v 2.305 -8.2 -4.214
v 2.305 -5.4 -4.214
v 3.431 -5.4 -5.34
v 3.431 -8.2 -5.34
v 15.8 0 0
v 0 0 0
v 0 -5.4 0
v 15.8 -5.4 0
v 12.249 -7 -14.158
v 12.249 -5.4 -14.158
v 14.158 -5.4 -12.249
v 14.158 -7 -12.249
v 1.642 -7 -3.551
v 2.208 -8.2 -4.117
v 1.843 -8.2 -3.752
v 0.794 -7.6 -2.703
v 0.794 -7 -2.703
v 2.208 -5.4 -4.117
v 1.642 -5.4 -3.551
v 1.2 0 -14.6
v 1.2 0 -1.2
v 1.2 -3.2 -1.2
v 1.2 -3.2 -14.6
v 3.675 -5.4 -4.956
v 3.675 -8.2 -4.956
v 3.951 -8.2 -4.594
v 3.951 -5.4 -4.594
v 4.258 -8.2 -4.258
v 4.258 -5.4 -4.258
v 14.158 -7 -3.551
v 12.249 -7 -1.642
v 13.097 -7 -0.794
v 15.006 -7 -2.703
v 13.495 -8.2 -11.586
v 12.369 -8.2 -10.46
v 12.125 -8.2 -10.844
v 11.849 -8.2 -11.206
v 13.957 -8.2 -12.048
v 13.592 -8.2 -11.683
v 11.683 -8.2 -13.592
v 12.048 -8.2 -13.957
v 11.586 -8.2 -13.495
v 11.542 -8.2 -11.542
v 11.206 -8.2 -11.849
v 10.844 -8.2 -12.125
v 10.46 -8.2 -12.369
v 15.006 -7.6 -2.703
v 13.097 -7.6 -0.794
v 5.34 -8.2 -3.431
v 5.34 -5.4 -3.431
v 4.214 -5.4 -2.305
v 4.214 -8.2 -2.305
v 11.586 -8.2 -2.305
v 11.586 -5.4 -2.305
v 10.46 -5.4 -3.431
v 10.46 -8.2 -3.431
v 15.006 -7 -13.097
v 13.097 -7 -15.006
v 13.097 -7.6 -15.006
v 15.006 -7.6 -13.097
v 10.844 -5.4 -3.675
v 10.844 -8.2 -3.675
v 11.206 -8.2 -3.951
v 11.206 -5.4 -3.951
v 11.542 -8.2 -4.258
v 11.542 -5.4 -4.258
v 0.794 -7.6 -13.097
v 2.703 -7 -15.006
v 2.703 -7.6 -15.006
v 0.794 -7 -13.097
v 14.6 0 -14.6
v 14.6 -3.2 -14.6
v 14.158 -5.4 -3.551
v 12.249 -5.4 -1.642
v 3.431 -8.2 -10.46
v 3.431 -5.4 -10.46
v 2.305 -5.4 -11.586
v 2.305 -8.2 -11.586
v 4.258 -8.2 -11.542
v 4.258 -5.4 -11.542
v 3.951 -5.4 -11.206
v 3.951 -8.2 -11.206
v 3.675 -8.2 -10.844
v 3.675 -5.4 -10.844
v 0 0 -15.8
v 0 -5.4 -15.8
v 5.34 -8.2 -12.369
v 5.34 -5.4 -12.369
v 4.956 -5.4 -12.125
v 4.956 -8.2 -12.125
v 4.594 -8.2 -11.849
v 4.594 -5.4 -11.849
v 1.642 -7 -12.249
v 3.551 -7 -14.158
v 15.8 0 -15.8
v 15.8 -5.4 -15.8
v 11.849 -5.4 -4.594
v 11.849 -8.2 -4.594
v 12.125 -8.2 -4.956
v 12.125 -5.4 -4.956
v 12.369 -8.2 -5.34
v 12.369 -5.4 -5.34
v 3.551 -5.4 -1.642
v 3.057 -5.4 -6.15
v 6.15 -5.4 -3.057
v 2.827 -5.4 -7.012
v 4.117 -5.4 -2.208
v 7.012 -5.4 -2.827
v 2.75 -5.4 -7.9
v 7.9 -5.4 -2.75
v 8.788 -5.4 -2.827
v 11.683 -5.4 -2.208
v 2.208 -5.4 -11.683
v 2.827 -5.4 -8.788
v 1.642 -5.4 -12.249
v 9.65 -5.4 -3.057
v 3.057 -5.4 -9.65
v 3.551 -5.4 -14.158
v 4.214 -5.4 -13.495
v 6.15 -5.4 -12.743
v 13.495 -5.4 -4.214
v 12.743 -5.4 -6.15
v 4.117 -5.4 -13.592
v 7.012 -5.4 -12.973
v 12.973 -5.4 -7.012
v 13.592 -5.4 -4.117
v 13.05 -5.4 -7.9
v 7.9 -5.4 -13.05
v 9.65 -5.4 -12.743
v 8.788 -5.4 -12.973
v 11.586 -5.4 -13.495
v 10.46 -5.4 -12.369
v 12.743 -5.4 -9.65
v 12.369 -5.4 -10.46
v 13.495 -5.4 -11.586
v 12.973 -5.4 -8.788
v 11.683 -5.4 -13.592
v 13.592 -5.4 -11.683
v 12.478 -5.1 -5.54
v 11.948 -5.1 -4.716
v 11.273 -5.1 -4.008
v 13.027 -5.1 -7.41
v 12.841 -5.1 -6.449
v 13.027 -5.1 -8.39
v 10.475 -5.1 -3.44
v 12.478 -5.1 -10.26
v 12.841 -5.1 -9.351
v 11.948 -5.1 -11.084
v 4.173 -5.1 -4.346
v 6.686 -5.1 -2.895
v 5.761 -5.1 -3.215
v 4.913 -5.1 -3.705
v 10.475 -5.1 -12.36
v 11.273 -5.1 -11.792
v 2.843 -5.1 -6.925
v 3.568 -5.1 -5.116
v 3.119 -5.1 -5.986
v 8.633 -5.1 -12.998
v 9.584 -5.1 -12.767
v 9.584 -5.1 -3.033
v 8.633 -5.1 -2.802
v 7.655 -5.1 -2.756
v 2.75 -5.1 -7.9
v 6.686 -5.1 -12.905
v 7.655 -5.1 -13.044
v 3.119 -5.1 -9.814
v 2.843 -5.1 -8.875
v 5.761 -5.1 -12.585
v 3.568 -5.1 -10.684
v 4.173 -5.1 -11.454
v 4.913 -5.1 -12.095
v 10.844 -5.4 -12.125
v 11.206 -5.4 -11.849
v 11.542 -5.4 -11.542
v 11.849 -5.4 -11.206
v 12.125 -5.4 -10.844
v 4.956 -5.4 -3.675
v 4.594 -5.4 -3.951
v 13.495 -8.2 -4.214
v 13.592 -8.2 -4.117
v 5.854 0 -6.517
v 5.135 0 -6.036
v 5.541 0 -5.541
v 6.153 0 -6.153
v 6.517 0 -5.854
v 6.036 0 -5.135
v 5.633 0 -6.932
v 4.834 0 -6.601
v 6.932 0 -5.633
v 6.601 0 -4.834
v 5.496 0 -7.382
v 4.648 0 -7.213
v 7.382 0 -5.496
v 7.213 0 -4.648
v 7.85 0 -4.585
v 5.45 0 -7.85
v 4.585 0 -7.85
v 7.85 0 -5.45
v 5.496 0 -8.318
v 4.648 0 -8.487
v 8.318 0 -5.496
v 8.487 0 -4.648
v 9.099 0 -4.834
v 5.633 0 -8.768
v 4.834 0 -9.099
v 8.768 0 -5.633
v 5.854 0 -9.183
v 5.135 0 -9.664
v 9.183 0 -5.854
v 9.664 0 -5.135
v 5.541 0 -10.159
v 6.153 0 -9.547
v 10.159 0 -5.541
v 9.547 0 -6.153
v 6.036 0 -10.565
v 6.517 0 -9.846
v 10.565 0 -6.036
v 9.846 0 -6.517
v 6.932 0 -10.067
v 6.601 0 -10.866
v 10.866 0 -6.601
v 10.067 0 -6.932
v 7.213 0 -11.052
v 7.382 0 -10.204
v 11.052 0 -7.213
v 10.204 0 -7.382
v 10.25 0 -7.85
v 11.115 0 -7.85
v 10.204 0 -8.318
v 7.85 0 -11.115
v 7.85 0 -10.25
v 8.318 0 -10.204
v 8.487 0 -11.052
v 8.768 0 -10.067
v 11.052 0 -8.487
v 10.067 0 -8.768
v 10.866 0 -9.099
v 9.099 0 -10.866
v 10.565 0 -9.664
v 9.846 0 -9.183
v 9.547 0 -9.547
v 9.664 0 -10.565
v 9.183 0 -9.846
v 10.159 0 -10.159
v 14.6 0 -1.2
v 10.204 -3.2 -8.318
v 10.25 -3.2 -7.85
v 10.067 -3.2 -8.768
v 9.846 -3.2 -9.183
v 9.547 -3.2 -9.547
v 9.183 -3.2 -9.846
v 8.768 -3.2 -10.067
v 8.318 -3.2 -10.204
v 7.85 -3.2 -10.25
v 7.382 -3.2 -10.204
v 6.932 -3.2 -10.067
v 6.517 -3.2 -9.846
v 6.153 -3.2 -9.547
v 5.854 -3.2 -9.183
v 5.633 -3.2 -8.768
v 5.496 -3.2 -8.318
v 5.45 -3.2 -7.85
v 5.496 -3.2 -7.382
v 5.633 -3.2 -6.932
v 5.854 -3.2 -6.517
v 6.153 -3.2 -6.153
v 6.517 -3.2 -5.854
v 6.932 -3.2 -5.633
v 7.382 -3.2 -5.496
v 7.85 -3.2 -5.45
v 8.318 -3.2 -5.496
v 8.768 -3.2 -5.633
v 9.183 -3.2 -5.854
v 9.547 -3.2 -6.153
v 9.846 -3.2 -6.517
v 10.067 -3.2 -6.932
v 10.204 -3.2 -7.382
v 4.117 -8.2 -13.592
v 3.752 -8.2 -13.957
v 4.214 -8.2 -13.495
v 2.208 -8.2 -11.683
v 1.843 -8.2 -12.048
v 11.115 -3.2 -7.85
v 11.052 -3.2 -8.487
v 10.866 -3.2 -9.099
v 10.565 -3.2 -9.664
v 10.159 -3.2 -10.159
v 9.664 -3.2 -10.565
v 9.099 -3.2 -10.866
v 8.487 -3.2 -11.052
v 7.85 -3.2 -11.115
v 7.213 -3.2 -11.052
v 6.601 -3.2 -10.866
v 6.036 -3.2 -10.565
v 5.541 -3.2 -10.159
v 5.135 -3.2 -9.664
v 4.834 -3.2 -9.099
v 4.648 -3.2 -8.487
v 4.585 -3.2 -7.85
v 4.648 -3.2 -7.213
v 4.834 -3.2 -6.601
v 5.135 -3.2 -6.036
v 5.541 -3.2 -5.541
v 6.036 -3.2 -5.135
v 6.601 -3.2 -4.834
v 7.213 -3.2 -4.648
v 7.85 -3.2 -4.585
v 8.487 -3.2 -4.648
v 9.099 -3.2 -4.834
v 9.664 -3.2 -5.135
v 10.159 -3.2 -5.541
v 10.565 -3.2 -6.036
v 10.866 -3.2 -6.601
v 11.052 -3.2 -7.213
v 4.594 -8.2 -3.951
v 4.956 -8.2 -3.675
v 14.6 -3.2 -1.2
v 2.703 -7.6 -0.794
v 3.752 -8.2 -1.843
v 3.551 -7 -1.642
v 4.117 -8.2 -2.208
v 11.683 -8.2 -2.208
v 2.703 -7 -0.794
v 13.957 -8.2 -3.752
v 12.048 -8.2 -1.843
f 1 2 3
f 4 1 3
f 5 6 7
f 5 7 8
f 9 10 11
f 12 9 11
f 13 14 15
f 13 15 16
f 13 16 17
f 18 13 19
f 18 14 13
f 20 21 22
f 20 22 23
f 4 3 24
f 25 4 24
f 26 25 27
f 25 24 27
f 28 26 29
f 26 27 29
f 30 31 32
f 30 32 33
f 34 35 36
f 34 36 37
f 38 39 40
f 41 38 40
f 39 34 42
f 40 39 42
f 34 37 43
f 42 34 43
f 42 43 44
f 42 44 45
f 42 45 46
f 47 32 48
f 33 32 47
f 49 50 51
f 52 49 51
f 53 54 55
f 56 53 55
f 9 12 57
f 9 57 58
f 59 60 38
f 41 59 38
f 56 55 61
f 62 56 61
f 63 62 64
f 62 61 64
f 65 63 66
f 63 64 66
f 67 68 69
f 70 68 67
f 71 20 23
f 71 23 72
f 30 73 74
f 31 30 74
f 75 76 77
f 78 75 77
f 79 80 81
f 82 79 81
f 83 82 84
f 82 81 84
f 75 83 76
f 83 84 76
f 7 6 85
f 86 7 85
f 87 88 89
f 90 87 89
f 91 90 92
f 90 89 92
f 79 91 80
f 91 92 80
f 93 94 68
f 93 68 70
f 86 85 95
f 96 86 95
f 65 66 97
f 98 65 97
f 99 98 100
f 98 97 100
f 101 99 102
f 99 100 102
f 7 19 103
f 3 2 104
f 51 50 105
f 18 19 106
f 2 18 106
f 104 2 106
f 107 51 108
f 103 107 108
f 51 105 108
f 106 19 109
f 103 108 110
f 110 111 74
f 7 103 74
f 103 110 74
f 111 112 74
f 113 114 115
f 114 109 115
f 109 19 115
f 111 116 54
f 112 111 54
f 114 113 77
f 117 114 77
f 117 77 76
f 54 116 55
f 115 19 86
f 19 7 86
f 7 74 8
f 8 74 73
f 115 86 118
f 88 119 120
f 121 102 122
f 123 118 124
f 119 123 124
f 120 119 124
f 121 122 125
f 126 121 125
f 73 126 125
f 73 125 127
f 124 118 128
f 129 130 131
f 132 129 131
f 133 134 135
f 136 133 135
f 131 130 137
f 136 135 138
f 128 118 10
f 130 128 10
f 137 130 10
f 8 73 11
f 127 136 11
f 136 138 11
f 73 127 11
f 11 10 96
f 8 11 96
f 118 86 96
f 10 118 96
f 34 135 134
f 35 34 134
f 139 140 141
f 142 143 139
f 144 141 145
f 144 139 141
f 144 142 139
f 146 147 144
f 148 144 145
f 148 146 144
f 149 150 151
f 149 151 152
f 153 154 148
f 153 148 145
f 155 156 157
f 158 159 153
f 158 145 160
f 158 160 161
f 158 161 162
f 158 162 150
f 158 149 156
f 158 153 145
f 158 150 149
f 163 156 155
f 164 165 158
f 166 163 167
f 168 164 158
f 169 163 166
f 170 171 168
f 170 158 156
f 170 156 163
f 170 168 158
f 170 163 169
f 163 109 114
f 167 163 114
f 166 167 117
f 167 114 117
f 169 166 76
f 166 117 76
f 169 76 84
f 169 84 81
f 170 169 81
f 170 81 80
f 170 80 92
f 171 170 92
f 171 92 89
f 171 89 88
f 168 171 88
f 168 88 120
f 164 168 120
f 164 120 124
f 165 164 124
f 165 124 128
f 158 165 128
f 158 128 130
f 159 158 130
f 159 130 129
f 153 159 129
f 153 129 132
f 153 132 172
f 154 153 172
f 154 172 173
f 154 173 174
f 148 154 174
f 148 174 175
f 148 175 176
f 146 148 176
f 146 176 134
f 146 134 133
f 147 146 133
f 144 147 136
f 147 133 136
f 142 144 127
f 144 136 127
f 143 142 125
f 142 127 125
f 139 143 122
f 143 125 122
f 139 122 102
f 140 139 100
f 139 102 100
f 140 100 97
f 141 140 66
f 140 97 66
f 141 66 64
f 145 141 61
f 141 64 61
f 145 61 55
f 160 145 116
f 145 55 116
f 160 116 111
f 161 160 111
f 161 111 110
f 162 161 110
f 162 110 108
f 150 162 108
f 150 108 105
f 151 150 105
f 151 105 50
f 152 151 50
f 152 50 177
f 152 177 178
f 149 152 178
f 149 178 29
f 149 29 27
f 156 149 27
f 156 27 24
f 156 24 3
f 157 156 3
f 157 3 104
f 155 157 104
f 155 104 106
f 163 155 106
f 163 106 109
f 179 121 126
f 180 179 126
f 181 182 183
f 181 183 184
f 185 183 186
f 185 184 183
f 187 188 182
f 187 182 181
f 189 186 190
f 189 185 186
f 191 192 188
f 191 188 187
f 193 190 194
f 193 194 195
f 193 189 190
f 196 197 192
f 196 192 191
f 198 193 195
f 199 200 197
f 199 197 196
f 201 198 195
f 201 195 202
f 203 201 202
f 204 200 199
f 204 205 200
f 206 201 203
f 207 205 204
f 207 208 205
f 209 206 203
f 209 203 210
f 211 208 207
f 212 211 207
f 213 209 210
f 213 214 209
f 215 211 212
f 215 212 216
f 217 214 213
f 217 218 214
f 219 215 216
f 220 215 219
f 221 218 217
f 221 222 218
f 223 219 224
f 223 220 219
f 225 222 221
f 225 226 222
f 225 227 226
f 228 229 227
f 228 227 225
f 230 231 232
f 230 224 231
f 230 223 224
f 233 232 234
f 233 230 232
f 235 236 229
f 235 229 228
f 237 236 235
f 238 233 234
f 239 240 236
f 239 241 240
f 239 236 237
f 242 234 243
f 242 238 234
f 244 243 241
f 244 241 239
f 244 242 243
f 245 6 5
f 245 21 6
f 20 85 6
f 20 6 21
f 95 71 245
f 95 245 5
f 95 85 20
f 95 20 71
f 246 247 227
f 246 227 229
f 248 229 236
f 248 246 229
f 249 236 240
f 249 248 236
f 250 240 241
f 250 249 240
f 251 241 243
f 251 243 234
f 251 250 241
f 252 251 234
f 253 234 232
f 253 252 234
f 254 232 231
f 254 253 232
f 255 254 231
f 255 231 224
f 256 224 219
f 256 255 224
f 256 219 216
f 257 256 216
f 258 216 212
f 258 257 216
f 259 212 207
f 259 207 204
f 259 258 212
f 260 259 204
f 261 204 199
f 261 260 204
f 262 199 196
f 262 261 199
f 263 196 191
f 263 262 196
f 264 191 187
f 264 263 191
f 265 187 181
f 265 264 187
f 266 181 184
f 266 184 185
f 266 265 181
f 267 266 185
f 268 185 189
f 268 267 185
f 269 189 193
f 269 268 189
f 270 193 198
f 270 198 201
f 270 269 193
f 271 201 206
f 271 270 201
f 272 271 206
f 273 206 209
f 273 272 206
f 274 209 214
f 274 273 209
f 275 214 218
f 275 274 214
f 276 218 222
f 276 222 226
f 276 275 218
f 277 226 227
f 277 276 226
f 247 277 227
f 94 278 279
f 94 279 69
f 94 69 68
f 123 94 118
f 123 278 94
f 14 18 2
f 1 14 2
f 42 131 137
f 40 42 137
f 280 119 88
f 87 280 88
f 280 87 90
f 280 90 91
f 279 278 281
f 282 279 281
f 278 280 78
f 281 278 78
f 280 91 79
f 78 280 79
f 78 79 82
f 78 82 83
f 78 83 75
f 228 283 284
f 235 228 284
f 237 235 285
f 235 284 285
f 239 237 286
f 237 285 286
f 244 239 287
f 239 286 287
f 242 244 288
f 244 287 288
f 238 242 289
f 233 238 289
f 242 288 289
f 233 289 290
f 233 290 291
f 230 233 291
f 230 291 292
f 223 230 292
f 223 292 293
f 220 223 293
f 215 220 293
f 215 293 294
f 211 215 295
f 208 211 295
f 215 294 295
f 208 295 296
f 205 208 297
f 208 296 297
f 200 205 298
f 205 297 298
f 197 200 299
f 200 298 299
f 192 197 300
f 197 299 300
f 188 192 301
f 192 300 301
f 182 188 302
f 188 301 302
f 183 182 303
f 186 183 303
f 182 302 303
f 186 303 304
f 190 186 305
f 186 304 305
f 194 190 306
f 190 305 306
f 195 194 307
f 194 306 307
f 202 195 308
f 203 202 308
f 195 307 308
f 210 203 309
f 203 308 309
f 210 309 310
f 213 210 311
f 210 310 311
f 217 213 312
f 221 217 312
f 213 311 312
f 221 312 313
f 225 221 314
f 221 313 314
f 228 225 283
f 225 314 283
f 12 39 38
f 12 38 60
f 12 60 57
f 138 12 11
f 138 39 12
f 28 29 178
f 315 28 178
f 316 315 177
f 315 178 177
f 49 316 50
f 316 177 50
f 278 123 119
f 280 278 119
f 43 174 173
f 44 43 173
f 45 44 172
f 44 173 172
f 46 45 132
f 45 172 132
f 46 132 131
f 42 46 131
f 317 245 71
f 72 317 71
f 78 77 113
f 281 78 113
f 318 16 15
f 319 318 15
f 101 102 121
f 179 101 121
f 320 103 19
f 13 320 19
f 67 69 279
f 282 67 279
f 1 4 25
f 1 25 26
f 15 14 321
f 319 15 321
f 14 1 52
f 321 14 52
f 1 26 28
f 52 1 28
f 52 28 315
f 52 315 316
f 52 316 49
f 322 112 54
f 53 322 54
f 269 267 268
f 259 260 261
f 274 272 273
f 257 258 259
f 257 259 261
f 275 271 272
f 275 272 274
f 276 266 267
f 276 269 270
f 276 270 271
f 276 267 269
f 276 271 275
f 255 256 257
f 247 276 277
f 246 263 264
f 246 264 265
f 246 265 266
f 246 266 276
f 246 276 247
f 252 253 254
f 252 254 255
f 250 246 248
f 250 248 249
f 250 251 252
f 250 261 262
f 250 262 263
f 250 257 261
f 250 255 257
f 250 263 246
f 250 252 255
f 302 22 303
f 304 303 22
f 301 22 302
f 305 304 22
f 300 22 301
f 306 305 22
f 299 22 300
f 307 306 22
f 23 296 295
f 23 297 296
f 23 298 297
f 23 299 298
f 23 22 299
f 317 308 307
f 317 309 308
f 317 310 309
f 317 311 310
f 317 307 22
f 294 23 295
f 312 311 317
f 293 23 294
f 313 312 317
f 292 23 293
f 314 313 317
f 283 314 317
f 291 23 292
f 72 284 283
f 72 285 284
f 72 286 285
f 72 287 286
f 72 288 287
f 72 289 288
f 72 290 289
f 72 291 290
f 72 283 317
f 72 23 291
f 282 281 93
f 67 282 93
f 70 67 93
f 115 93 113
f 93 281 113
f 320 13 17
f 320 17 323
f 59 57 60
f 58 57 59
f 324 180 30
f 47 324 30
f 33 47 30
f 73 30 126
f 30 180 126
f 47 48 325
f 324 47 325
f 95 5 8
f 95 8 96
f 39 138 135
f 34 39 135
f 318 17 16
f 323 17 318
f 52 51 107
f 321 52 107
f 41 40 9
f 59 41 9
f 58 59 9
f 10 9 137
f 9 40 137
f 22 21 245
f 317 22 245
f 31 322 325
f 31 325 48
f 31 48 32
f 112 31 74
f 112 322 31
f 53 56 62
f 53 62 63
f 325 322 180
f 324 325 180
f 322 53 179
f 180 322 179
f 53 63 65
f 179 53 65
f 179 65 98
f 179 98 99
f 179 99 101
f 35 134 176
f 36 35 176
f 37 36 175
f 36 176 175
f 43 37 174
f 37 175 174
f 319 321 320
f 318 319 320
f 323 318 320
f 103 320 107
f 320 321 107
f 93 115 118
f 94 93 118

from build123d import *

# Parameters (mm, degrees)
SKETCH2_W            = 15.8
SKETCH2_H            = 15.8
BOSS_EXTRUDE2_DEPTH  = 5.4
SKETCH4_W            = 13.4
SKETCH4_H            = 13.4
CUT_EXTRUDE1_DEPTH   = 3.2
SKETCH7_R            = 3.265
SKETCH7_R_2          = 2.4
BOSS_EXTRUDE5_DEPTH  = 3.2
SKETCH8_R            = 5.15
CUT_EXTRUDE2_DEPTH   = 0.3
BOSS_EXTRUDE8_DEPTH  = 2.8
SKETCH27_W           = 2.7
SKETCH27_H           = 1.2
BOSS_EXTRUDE10_DEPTH = 1.2
CUT_EXTRUDE3_DEPTH   = 2.7
CIRPATTERN1_COUNT    = 4


with BuildPart() as part:
    # Sketch2 → Boss-Extrude2 (new body)
    with BuildSketch(Plane(origin=(0, 0, 0), x_dir=(1, 0, 0), z_dir=(0, 1, 0))):
        with Locations((7.9, 7.9)):
            Rectangle(SKETCH2_W, SKETCH2_H)
    extrude(amount=-BOSS_EXTRUDE2_DEPTH)

    # Sketch4 → Cut-Extrude1 (cut)
    with BuildSketch(Plane(origin=(0, 0, 0), x_dir=(1, 0, 0), z_dir=(0, 1, 0))):
        with Locations((7.9, 7.9)):
            Rectangle(SKETCH4_W, SKETCH4_H)
    extrude(amount=-CUT_EXTRUDE1_DEPTH, mode=Mode.SUBTRACT)

    # Sketch7 → Boss-Extrude5 (add)
    with BuildSketch(Plane(origin=(0, -3.2, 0), x_dir=(1, 0, 0), z_dir=(0, 1, 0))):
        with Locations((7.85, 7.85)):
            Circle(SKETCH7_R)
        with Locations((7.85, 7.85)):
            Circle(SKETCH7_R_2, mode=Mode.SUBTRACT)
    extrude(amount=BOSS_EXTRUDE5_DEPTH)

    # Sketch8 → Cut-Extrude2 (cut)
    with BuildSketch(Plane(origin=(0, -5.4, 0), x_dir=(-1, 0, 0), z_dir=(0, -1, 0))):
        with Locations((-7.9, 7.9)):
            Circle(SKETCH8_R)
    extrude(amount=-CUT_EXTRUDE2_DEPTH, mode=Mode.SUBTRACT)

    # Sketch11 → Boss-Extrude8 (add)
    with BuildSketch(Plane.XZ.offset(5.4)):
        Polygon((11.683021279, -2.207790411), (12.637615434, -3.162384566), (13.203300859, -2.596699141), (12.248706704, -1.642104986), align=None)
        with BuildLine():
            ThreePointArc((11.585853022, -2.304958669), (12.133497372, -2.706975833), (12.637615434, -3.162384566))
            Line((12.637615434, -3.162384566), (11.683021279, -2.207790411))
            Line((11.683021279, -2.207790411), (11.585853022, -2.304958669))
        make_face()
        with BuildLine():
            ThreePointArc((10.459662524, -3.431149167), (11.028098464, -3.808851017), (11.541599923, -4.258400077))
            Line((11.541599923, -4.258400077), (12.637615434, -3.162384566))
            ThreePointArc((12.637615434, -3.162384566), (12.133497372, -2.706975833), (11.585853022, -2.304958669))
            Line((11.585853022, -2.304958669), (10.459662524, -3.431149167))
        make_face()
        with BuildLine():
            Line((12.637615434, -3.162384566), (11.541599923, -4.258400077))
            ThreePointArc((11.541599923, -4.258400077), (11.991148983, -4.771901536), (12.368850833, -5.340337476))
            Line((12.368850833, -5.340337476), (13.495041331, -4.214146978))
            ThreePointArc((13.495041331, -4.214146978), (13.093024167, -3.666502628), (12.637615434, -3.162384566))
        make_face()
        with BuildLine():
            Line((13.592209589, -4.116978721), (12.637615434, -3.162384566))
            ThreePointArc((12.637615434, -3.162384566), (13.093024167, -3.666502628), (13.495041331, -4.214146978))
            Line((13.495041331, -4.214146978), (13.592209589, -4.116978721))
        make_face()
        Polygon((13.203300859, -2.596699141), (12.637615434, -3.162384566), (13.592209589, -4.116978721), (14.157895014, -3.551293296), align=None)
    boss_extrude8 = extrude(amount=BOSS_EXTRUDE8_DEPTH)

    # Sketch27 → Boss-Extrude10 (add)
    with BuildSketch(Plane(origin=(5.303300859, 0, 5.303300859), x_dir=(0.707106781, 0, -0.707106781), z_dir=(0.707106781, 0, 0.707106781))):
        with Locations((11.172287143, -7.6)):
            Rectangle(SKETCH27_W, SKETCH27_H)
    boss_extrude10 = extrude(amount=BOSS_EXTRUDE10_DEPTH)

    # Sketch28 → Cut-Extrude3 (cut)
    with BuildSketch(Plane(origin=(6.945405845, 0, -6.945405845), x_dir=(0.707106781, 0, 0.707106781), z_dir=(-0.707106781, 0, 0.707106781))):
        Polygon((8.7, -7.6), (7.215606324, -8.2), (8.7, -8.2), align=None)
    cut_extrude3 = extrude(amount=-CUT_EXTRUDE3_DEPTH, mode=Mode.SUBTRACT)

    # CirPattern1: Boss-Extrude8, Boss-Extrude10, Cut-Extrude3 ×4 about axis
    cirpattern1_axis = Axis((7.9, 0, -7.9), (0, 1, 0))
    for i in range(1, CIRPATTERN1_COUNT):
        add(boss_extrude8.rotate(cirpattern1_axis, i * 360 / CIRPATTERN1_COUNT))
        add(boss_extrude10.rotate(cirpattern1_axis, i * 360 / CIRPATTERN1_COUNT))
        add(cut_extrude3.rotate(cirpattern1_axis, i * 360 / CIRPATTERN1_COUNT), mode=Mode.SUBTRACT)


solid = part.part
